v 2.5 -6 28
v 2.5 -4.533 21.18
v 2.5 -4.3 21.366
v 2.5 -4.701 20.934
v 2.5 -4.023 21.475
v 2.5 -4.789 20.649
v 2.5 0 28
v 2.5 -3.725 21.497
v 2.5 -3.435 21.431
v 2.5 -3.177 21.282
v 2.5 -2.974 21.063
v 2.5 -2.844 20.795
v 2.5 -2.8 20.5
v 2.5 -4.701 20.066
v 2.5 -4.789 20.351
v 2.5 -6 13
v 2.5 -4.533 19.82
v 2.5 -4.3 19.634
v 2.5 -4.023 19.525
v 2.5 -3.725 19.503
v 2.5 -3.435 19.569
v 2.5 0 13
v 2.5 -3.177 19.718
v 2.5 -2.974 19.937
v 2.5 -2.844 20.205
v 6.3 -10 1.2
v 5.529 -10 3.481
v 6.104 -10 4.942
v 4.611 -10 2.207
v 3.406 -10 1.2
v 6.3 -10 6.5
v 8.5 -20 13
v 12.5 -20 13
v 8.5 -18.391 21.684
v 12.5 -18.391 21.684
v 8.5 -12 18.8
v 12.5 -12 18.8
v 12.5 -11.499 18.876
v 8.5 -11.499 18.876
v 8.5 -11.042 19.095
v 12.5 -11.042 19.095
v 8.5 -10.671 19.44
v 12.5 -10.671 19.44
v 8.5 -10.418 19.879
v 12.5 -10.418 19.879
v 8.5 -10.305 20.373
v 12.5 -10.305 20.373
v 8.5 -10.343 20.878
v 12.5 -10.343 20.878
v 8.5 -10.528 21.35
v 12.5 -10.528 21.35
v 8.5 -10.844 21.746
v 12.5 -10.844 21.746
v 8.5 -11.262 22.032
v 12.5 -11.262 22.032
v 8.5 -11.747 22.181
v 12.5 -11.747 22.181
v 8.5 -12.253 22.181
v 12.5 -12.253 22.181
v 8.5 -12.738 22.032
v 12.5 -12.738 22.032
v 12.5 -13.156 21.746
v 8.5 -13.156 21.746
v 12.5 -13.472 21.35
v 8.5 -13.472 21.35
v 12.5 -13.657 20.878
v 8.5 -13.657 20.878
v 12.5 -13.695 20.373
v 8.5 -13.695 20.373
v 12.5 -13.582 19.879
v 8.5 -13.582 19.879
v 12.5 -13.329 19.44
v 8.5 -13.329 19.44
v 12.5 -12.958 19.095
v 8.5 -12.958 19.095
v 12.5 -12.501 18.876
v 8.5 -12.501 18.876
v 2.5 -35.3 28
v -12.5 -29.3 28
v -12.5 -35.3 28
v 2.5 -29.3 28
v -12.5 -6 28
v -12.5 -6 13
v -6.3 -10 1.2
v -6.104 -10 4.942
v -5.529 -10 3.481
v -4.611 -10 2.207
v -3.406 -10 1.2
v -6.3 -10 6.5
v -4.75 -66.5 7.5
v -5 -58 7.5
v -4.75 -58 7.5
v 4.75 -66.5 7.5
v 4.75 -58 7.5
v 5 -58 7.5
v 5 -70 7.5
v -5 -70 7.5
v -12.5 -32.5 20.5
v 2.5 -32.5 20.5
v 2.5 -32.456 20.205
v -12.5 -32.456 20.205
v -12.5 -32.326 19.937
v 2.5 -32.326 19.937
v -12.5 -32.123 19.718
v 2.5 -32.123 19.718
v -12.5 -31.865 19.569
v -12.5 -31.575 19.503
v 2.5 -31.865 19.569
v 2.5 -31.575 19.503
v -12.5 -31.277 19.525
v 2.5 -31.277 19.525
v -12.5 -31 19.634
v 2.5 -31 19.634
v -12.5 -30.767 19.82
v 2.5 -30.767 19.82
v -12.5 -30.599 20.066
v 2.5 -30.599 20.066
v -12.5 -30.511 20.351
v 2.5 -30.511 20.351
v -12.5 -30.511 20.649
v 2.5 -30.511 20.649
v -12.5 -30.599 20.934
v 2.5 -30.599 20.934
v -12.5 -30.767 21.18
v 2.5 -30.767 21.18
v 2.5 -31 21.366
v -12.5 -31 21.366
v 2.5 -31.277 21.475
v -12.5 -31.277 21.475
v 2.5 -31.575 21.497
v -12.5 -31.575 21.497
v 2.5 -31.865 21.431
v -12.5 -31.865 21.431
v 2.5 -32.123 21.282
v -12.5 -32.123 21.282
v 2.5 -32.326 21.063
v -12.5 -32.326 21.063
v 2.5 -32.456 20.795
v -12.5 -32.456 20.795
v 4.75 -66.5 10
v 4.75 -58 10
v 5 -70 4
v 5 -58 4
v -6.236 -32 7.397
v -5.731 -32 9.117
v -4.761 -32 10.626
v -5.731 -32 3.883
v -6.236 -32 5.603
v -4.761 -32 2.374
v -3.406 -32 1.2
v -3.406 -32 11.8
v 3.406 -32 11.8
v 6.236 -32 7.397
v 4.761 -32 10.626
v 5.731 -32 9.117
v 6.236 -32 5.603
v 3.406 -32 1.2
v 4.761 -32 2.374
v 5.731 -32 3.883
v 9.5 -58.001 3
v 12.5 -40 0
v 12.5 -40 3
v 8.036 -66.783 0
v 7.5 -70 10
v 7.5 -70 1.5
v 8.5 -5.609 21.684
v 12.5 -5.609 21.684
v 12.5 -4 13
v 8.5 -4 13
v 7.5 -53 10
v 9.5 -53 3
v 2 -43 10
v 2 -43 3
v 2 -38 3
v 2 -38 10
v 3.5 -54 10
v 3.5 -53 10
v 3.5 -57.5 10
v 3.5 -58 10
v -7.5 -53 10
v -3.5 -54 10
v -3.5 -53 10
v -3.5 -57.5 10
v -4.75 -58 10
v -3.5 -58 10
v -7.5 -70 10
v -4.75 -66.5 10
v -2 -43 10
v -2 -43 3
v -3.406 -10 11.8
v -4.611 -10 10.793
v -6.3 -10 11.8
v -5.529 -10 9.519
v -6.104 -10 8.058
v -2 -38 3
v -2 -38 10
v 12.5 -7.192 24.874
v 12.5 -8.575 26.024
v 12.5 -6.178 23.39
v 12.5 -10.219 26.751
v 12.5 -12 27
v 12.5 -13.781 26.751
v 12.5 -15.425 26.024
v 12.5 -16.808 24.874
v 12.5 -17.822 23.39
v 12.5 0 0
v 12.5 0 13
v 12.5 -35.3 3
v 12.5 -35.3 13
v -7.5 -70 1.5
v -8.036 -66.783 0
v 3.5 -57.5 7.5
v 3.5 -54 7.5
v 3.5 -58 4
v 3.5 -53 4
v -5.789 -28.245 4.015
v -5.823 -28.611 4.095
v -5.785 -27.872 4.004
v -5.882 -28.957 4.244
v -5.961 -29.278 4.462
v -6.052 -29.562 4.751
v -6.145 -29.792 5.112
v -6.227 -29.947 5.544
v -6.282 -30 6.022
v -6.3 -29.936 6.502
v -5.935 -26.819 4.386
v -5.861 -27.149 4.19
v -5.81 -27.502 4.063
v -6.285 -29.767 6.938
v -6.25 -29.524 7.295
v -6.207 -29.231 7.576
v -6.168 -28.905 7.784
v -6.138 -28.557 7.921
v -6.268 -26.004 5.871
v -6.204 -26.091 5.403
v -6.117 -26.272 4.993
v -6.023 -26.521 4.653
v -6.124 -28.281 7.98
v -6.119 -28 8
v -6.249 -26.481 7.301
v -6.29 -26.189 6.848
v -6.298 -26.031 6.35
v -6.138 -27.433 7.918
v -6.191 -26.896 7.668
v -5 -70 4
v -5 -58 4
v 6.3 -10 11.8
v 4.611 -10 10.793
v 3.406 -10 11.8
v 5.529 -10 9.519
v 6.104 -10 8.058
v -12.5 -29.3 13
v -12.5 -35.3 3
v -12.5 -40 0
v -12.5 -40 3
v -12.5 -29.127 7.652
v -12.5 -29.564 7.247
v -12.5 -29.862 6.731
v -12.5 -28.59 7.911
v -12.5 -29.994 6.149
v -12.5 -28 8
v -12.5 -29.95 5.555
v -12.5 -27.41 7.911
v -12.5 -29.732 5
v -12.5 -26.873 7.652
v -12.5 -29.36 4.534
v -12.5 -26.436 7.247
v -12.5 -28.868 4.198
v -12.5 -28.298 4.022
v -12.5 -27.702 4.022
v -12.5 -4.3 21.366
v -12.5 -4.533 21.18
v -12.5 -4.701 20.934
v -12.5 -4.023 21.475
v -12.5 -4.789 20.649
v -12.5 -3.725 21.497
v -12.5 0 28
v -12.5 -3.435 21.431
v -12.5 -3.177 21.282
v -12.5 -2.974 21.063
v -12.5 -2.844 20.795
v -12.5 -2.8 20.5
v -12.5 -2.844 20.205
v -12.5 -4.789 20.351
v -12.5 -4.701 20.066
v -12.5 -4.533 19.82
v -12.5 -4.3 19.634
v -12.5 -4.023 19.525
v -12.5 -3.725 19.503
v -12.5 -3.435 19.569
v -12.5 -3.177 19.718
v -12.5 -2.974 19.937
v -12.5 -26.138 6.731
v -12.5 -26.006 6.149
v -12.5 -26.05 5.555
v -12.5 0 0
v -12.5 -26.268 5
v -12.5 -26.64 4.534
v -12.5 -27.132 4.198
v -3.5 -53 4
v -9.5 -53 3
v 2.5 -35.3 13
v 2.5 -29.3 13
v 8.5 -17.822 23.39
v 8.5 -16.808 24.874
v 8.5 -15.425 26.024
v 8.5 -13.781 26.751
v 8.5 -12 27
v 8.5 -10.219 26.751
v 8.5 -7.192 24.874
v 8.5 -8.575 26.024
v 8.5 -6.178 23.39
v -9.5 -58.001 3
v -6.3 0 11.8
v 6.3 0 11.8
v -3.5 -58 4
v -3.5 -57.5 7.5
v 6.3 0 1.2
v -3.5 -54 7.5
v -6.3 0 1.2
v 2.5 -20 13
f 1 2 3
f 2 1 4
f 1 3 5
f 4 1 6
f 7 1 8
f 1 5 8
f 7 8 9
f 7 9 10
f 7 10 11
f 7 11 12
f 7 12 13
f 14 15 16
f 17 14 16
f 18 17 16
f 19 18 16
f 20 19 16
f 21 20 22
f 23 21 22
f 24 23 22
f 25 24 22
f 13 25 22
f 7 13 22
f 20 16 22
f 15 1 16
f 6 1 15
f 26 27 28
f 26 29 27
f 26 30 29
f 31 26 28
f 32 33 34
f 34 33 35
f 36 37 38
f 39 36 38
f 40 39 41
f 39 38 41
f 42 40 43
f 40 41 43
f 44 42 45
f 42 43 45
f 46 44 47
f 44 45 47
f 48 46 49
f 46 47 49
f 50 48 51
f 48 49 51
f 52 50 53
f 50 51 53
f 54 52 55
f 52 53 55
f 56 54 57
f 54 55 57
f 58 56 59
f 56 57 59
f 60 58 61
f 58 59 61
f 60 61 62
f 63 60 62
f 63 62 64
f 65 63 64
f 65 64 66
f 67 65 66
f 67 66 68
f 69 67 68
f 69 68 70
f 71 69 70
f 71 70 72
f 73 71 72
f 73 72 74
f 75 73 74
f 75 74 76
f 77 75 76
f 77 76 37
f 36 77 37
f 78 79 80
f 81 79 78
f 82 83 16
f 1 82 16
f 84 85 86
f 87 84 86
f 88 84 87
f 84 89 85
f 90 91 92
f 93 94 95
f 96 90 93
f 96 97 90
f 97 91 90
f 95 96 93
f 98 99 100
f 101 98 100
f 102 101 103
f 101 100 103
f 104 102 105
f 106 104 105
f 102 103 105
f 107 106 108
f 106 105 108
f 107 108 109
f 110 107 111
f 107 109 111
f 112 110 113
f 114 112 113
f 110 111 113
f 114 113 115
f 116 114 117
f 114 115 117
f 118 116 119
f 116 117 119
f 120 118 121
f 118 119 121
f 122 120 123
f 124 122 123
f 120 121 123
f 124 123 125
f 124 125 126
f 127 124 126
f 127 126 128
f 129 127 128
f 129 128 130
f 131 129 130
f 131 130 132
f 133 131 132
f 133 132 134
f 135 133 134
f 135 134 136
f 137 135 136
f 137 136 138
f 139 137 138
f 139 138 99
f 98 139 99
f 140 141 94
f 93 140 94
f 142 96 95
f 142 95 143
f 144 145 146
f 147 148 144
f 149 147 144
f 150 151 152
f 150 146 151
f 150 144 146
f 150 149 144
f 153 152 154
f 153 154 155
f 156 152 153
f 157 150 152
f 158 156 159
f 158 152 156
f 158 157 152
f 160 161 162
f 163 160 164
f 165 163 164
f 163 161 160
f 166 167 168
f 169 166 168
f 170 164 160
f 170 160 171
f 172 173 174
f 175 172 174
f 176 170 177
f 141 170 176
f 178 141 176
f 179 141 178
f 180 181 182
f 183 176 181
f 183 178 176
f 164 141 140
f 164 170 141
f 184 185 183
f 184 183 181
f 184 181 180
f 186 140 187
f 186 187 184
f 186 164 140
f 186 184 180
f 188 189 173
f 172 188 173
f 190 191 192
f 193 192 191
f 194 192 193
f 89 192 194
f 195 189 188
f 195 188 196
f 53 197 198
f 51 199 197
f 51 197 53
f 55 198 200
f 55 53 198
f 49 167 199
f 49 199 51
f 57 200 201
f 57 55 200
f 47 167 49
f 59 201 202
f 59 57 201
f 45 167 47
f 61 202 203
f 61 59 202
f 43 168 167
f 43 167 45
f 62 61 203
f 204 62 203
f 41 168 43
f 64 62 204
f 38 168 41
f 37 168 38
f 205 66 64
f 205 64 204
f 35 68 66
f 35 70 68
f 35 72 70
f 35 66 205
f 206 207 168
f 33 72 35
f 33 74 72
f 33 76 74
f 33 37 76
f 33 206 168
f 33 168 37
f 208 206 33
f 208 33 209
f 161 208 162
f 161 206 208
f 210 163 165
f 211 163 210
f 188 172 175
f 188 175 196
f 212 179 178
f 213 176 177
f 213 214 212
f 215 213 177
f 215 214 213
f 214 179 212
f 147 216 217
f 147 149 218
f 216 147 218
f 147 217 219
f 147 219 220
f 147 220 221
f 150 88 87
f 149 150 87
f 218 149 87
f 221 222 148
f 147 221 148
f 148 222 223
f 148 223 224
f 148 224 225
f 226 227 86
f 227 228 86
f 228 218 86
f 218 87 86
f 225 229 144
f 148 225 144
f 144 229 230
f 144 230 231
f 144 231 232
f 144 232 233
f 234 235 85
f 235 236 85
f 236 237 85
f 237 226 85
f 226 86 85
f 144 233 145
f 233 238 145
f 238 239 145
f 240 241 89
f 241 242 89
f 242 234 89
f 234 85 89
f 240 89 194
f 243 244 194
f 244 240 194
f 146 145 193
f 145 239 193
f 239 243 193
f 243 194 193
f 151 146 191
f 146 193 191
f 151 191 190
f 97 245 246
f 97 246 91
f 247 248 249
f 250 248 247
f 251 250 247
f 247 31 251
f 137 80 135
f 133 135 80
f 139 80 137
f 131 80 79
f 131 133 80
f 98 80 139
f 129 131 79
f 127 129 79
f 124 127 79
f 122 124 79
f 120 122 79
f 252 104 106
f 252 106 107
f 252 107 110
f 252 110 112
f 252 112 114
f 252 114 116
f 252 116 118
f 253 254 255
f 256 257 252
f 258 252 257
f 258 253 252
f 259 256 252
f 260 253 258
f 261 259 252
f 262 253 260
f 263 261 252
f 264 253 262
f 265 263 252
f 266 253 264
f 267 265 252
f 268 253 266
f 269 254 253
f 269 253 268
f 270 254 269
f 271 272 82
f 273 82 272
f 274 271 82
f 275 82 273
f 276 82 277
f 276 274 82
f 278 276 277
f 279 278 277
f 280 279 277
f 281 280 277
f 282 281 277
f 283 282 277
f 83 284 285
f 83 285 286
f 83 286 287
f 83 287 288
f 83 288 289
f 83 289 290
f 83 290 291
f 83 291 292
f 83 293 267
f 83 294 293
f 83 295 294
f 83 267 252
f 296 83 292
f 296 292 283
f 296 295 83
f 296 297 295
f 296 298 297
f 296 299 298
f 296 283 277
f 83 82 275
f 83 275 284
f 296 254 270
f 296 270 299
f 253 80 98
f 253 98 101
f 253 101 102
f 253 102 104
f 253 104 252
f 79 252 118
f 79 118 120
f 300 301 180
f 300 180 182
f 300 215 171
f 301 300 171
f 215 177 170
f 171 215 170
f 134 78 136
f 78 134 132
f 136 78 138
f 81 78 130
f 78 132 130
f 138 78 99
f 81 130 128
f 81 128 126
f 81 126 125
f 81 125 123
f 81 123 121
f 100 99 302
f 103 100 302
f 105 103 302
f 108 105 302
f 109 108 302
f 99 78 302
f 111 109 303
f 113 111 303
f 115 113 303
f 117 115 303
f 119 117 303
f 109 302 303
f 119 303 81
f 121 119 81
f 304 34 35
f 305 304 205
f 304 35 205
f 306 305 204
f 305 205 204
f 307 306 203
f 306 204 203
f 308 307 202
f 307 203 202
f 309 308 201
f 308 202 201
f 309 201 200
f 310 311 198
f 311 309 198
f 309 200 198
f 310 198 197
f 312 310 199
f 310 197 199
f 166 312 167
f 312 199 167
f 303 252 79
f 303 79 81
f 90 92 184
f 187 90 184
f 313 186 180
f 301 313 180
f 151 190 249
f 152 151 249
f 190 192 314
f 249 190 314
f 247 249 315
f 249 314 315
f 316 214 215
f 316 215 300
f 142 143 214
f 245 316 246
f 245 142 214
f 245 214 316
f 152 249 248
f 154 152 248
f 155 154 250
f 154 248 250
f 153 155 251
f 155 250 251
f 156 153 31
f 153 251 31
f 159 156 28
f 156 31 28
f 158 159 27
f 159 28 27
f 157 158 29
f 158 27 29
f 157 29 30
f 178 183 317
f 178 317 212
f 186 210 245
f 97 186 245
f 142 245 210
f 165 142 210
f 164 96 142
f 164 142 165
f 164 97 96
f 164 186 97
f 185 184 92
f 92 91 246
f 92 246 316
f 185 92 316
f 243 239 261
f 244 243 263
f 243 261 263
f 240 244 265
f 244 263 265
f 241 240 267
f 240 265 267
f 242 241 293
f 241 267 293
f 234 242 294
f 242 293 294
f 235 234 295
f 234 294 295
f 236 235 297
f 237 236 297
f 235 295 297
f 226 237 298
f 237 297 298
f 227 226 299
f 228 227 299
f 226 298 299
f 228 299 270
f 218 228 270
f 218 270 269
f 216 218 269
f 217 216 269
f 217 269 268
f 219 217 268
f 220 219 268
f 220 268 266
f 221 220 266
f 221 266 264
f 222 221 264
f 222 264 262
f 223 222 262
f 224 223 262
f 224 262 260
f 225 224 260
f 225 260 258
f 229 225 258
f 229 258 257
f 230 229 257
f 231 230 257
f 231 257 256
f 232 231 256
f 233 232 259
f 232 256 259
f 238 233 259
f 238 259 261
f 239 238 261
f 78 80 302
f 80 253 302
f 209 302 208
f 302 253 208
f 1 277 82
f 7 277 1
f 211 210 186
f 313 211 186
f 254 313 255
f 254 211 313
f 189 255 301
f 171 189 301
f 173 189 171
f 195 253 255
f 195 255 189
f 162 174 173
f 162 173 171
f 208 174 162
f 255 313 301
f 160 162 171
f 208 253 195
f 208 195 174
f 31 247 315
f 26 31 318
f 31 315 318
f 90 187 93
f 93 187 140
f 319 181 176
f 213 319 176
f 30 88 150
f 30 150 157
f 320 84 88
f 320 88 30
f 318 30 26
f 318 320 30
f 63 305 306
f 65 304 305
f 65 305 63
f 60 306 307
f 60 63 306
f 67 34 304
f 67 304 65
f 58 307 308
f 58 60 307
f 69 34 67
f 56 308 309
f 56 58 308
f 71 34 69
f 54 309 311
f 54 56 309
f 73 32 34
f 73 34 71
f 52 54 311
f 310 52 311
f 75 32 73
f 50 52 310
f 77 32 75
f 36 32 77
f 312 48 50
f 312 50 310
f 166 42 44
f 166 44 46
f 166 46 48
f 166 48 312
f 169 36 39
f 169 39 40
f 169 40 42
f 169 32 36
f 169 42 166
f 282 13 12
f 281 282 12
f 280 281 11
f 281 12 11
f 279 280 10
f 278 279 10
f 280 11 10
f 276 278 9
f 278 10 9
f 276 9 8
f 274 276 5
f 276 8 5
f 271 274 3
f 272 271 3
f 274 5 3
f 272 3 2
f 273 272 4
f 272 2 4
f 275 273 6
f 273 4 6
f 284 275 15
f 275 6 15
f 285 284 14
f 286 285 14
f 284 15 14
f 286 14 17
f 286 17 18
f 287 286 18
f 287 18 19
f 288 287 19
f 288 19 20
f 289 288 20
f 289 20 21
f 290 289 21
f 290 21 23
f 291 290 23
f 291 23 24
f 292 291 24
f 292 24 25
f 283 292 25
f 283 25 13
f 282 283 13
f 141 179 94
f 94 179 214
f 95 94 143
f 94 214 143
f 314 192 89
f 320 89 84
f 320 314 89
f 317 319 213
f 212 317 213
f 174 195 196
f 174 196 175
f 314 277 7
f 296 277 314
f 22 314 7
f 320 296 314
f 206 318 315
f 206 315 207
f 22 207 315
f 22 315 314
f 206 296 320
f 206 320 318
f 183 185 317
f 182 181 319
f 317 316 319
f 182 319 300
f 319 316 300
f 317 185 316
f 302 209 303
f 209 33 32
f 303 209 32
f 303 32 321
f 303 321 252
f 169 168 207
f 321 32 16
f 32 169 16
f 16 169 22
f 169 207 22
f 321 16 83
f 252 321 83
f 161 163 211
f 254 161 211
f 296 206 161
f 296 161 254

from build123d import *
from OCP.BRepFilletAPI import BRepFilletAPI_MakeChamfer

# Parameters (mm, degrees)
RESSALTO_EXTRUS_O1_DEPTH = 13
ESBO_O2_W                = 15
ESBO_O2_H                = 6
ESBO_O2_W_2              = 4
ESBO_O2_H_2              = 16
RESSALTO_EXTRUS_O2_DEPTH = 15
ESBO_O3_R                = 1
CORTE_EXTRUS_O1_DEPTH    = 77.870020164
ESBO_O10_R               = 1.7
CORTE_EXTRUS_O4_DEPTH    = 10
ESBO_O11_W               = 25
ESBO_O11_H               = 34.7
CORTE_EXTRUS_O5_DEPTH    = 10
RESSALTO_EXTRUS_O3_DEPTH = 17
RESSALTO_EXTRUS_O4_REACH = 77.374
ESBO_O7_W                = 4
ESBO_O7_H                = 5
ESBO_O8_W                = 15
ESBO_O8_H                = 3.5
RESSALTO_EXTRUS_O5_DEPTH = 2.5
CHANFRO2_SIZE            = 2
CHANFRO2_SIZE_2          = 7
CHANFRO3_SIZE            = 1.5
CHANFRO3_SIZE2           = 3.216760381
ESBO_O12_W               = 12.6
ESBO_O12_H               = 10.6
CORTE_EXTRUS_O6_DEPTH    = 10
CORTE_EXTRUS_O7_DEPTH    = 22
ESBO_O15_R               = 2
CORTE_EXTRUS_O9_DEPTH    = 15


with BuildPart() as part:
    # Esboço1 → Ressalto-extrusão1 (new body)
    with BuildSketch(Plane.XY):
        Polygon((-12.5, 0), (12.5, 0), (12.5, -40), (7.5, -70), (-7.5, -70), (-12.5, -40), align=None)
    extrude(amount=RESSALTO_EXTRUS_O1_DEPTH)

    # Esboço2 → Ressalto-extrusão2 (add)
    with BuildSketch(Plane.XY.offset(13)):
        with Locations((-5, -32.3)):
            Rectangle(ESBO_O2_W, ESBO_O2_H)
        with Locations((-5, -3)):
            Rectangle(ESBO_O2_W, ESBO_O2_H)
        with Locations((10.5, -12)):
            Rectangle(ESBO_O2_W_2, ESBO_O2_H_2)
    extrude(amount=RESSALTO_EXTRUS_O2_DEPTH)

    # Esboço3 → Corte-extrusão1 (cut, through all)
    with BuildSketch(Plane(origin=(2.5, 0, 0), x_dir=(0, 0, -1), z_dir=(1, 0, 0))):
        with Locations(Location((-20.5, -3.8, 0), (0, 0, 90))):
            Circle(ESBO_O3_R)
        with Locations(Location((-20.5, -31.5, 0), (0, 0, 270))):
            Circle(ESBO_O3_R)
    extrude(amount=-CORTE_EXTRUS_O1_DEPTH, mode=Mode.SUBTRACT)

    # Esboço10 → Corte-extrusão4 (cut)
    with BuildSketch(Plane(origin=(12.5, 0, 0), x_dir=(0, 0, -1), z_dir=(1, 0, 0))):
        with Locations((-20.5, -12)):
            Circle(ESBO_O10_R)
        with BuildLine():
            Line((-13, -4), (-28, -4))
            Line((-28, -4), (-28, -20))
            Line((-28, -20), (-13, -20))
            Line((-13, -20), (-21.684004699, -18.391254405))
            ThreePointArc((-21.684004699, -18.391254405), (-27, -12), (-21.684004699, -5.608745595))
            Line((-21.684004699, -5.608745595), (-13, -4))
        make_face()
    extrude(amount=-CORTE_EXTRUS_O4_DEPTH, mode=Mode.SUBTRACT)

    # Esboço11 → Corte-extrusão5 (cut)
    with BuildSketch(Plane.XY.offset(13)):
        with Locations((0, -52.65)):
            Rectangle(ESBO_O11_W, ESBO_O11_H)
    extrude(amount=-CORTE_EXTRUS_O5_DEPTH, mode=Mode.SUBTRACT)

    # Esboço6 → Ressalto-extrusão3 (add)
    with BuildSketch(Plane.XZ.offset(70)):
        Polygon((-5, 4), (-5, 7.5), (-4.75, 7.5), (-4.75, 10), (-7.5, 10), (-7.5, 3), (7.5, 3), (7.5, 10), (4.75, 10), (4.75, 7.5), (5, 7.5), (5, 4), align=None)
    extrude(amount=-RESSALTO_EXTRUS_O3_DEPTH)

    # Ressalto-extrusão4: up to this face of the body (flat: up to its plane)
    ressalto_extrus_o4_end = Plane(part.part.faces().sort_by_distance((-6.125, -61.5, 10))[0])
    # Esboço7 → Ressalto-extrusão4 (add, up to the picked face)
    with BuildSketch(Plane.XY.offset(3), mode=Mode.PRIVATE) as ressalto_extrus_o4_sk1:
        with Locations((0, -40.5)):
            Rectangle(ESBO_O7_W, ESBO_O7_H)
    ressalto_extrus_o4_tool1 = split(extrude(ressalto_extrus_o4_sk1.sketch, amount=RESSALTO_EXTRUS_O4_REACH, mode=Mode.PRIVATE), bisect_by=ressalto_extrus_o4_end, keep=Keep.BOTH, mode=Mode.PRIVATE)
    # Esboço7 → Ressalto-extrusão4 (add, up to the picked face)
    with BuildSketch(Plane.XY.offset(3), mode=Mode.PRIVATE) as ressalto_extrus_o4_sk2:
        with Locations((5.5, -55.5)):
            Rectangle(ESBO_O7_W, ESBO_O7_H)
    ressalto_extrus_o4_tool2 = split(extrude(ressalto_extrus_o4_sk2.sketch, amount=RESSALTO_EXTRUS_O4_REACH, mode=Mode.PRIVATE), bisect_by=ressalto_extrus_o4_end, keep=Keep.BOTH, mode=Mode.PRIVATE)
    # Esboço7 → Ressalto-extrusão4 (add, up to the picked face)
    with BuildSketch(Plane.XY.offset(3), mode=Mode.PRIVATE) as ressalto_extrus_o4_sk3:
        with Locations((-5.5, -55.5)):
            Rectangle(ESBO_O7_W, ESBO_O7_H)
    ressalto_extrus_o4_tool3 = split(extrude(ressalto_extrus_o4_sk3.sketch, amount=RESSALTO_EXTRUS_O4_REACH, mode=Mode.PRIVATE), bisect_by=ressalto_extrus_o4_end, keep=Keep.BOTH, mode=Mode.PRIVATE)
    add(ressalto_extrus_o4_tool1.solids().sort_by(Axis((0, -40.5, 3), (0, 0, 1)))[0])
    add(ressalto_extrus_o4_tool2.solids().sort_by(Axis((5.5, -55.5, 3), (0, 0, 1)))[0])
    add(ressalto_extrus_o4_tool3.solids().sort_by(Axis((-5.5, -55.5, 3), (0, 0, 1)))[0])

    # Esboço8 → Ressalto-extrusão5 (add)
    with BuildSketch(Plane.XY.offset(10)):
        with Locations((0, -68.25)):
            Rectangle(ESBO_O8_W, ESBO_O8_H)
        with Locations((0, -55.75)):
            Rectangle(ESBO_O8_W, ESBO_O8_H)
    extrude(amount=-RESSALTO_EXTRUS_O5_DEPTH)

    # Chanfro2
    chanfro2_edges_1 = [part.edges().sort_by_distance(p)[0] for p in [
        (7.5, -61.5, 3),
    ]]
    chanfro2_side_1 = [part.faces().sort_by_distance(p)[0] for p in [
        (7.54, -61.5, 3),
    ]]
    chanfro2_edges_2 = [part.edges().sort_by_distance(p)[0] for p in [
        (-7.5, -61.5, 3),
    ]]
    chanfro2_side_2 = [part.faces().sort_by_distance(p)[0] for p in [
        (-7.54, -61.5, 3),
    ]]
    chanfro2 = BRepFilletAPI_MakeChamfer(part.part.solid().wrapped)
    for e in chanfro2_edges_1:
        chanfro2.Add(CHANFRO2_SIZE - 0.0001, CHANFRO2_SIZE_2 - 0.0001, e.wrapped, chanfro2_side_1[0].wrapped)
    for e in chanfro2_edges_2:
        chanfro2.Add(CHANFRO2_SIZE - 0.0001, CHANFRO2_SIZE_2 - 0.0001, e.wrapped, chanfro2_side_2[0].wrapped)
    add(Compound.cast(chanfro2.Shape()), mode=Mode.REPLACE)  # a hair under: the kernel refuses the full size

    # Chanfro3
    chanfro3_edges = [part.edges().sort_by_distance(p)[0] for p in [
        (0, -70, 0),
    ]]
    chanfro3_side = [part.faces().sort_by_distance(p)[0] for p in [
        (7.319722436, -70, 9.99995),
    ]]
    chamfer(chanfro3_edges, length=CHANFRO3_SIZE, length2=CHANFRO3_SIZE2, reference=chanfro3_side[0])

    # Esboço12 → Corte-extrusão6 (cut)
    with BuildSketch(Plane(origin=(0, 0, 0), x_dir=(1, 0, 0), z_dir=(0, 1, 0))):
        with Locations((0, -6.5)):
            Rectangle(ESBO_O12_W, ESBO_O12_H)
    extrude(amount=-CORTE_EXTRUS_O6_DEPTH, mode=Mode.SUBTRACT)

    # Esboço13 → Corte-extrusão7 (cut)
    with BuildSketch(Plane(origin=(0, -10, 0), x_dir=(1, 0, 0), z_dir=(0, 1, 0))):
        with BuildLine():
            Line((-3.405877273, -11.8), (3.405877273, -11.8))
            ThreePointArc((3.405877273, -11.8), (6.3, -6.5), (3.405877273, -1.2))
            Line((3.405877273, -1.2), (-3.405877273, -1.2))
            ThreePointArc((-3.405877273, -1.2), (-6.3, -6.5), (-3.405877273, -11.8))
        make_face()
    extrude(amount=-CORTE_EXTRUS_O7_DEPTH, mode=Mode.SUBTRACT)

    # Esboço15 → Corte-extrusão9 (cut)
    with BuildSketch(Plane.ZY.offset(12.5)):
        with Locations((6, -28)):
            Circle(ESBO_O15_R)
    extrude(amount=-CORTE_EXTRUS_O9_DEPTH, mode=Mode.SUBTRACT)


solid = part.part
